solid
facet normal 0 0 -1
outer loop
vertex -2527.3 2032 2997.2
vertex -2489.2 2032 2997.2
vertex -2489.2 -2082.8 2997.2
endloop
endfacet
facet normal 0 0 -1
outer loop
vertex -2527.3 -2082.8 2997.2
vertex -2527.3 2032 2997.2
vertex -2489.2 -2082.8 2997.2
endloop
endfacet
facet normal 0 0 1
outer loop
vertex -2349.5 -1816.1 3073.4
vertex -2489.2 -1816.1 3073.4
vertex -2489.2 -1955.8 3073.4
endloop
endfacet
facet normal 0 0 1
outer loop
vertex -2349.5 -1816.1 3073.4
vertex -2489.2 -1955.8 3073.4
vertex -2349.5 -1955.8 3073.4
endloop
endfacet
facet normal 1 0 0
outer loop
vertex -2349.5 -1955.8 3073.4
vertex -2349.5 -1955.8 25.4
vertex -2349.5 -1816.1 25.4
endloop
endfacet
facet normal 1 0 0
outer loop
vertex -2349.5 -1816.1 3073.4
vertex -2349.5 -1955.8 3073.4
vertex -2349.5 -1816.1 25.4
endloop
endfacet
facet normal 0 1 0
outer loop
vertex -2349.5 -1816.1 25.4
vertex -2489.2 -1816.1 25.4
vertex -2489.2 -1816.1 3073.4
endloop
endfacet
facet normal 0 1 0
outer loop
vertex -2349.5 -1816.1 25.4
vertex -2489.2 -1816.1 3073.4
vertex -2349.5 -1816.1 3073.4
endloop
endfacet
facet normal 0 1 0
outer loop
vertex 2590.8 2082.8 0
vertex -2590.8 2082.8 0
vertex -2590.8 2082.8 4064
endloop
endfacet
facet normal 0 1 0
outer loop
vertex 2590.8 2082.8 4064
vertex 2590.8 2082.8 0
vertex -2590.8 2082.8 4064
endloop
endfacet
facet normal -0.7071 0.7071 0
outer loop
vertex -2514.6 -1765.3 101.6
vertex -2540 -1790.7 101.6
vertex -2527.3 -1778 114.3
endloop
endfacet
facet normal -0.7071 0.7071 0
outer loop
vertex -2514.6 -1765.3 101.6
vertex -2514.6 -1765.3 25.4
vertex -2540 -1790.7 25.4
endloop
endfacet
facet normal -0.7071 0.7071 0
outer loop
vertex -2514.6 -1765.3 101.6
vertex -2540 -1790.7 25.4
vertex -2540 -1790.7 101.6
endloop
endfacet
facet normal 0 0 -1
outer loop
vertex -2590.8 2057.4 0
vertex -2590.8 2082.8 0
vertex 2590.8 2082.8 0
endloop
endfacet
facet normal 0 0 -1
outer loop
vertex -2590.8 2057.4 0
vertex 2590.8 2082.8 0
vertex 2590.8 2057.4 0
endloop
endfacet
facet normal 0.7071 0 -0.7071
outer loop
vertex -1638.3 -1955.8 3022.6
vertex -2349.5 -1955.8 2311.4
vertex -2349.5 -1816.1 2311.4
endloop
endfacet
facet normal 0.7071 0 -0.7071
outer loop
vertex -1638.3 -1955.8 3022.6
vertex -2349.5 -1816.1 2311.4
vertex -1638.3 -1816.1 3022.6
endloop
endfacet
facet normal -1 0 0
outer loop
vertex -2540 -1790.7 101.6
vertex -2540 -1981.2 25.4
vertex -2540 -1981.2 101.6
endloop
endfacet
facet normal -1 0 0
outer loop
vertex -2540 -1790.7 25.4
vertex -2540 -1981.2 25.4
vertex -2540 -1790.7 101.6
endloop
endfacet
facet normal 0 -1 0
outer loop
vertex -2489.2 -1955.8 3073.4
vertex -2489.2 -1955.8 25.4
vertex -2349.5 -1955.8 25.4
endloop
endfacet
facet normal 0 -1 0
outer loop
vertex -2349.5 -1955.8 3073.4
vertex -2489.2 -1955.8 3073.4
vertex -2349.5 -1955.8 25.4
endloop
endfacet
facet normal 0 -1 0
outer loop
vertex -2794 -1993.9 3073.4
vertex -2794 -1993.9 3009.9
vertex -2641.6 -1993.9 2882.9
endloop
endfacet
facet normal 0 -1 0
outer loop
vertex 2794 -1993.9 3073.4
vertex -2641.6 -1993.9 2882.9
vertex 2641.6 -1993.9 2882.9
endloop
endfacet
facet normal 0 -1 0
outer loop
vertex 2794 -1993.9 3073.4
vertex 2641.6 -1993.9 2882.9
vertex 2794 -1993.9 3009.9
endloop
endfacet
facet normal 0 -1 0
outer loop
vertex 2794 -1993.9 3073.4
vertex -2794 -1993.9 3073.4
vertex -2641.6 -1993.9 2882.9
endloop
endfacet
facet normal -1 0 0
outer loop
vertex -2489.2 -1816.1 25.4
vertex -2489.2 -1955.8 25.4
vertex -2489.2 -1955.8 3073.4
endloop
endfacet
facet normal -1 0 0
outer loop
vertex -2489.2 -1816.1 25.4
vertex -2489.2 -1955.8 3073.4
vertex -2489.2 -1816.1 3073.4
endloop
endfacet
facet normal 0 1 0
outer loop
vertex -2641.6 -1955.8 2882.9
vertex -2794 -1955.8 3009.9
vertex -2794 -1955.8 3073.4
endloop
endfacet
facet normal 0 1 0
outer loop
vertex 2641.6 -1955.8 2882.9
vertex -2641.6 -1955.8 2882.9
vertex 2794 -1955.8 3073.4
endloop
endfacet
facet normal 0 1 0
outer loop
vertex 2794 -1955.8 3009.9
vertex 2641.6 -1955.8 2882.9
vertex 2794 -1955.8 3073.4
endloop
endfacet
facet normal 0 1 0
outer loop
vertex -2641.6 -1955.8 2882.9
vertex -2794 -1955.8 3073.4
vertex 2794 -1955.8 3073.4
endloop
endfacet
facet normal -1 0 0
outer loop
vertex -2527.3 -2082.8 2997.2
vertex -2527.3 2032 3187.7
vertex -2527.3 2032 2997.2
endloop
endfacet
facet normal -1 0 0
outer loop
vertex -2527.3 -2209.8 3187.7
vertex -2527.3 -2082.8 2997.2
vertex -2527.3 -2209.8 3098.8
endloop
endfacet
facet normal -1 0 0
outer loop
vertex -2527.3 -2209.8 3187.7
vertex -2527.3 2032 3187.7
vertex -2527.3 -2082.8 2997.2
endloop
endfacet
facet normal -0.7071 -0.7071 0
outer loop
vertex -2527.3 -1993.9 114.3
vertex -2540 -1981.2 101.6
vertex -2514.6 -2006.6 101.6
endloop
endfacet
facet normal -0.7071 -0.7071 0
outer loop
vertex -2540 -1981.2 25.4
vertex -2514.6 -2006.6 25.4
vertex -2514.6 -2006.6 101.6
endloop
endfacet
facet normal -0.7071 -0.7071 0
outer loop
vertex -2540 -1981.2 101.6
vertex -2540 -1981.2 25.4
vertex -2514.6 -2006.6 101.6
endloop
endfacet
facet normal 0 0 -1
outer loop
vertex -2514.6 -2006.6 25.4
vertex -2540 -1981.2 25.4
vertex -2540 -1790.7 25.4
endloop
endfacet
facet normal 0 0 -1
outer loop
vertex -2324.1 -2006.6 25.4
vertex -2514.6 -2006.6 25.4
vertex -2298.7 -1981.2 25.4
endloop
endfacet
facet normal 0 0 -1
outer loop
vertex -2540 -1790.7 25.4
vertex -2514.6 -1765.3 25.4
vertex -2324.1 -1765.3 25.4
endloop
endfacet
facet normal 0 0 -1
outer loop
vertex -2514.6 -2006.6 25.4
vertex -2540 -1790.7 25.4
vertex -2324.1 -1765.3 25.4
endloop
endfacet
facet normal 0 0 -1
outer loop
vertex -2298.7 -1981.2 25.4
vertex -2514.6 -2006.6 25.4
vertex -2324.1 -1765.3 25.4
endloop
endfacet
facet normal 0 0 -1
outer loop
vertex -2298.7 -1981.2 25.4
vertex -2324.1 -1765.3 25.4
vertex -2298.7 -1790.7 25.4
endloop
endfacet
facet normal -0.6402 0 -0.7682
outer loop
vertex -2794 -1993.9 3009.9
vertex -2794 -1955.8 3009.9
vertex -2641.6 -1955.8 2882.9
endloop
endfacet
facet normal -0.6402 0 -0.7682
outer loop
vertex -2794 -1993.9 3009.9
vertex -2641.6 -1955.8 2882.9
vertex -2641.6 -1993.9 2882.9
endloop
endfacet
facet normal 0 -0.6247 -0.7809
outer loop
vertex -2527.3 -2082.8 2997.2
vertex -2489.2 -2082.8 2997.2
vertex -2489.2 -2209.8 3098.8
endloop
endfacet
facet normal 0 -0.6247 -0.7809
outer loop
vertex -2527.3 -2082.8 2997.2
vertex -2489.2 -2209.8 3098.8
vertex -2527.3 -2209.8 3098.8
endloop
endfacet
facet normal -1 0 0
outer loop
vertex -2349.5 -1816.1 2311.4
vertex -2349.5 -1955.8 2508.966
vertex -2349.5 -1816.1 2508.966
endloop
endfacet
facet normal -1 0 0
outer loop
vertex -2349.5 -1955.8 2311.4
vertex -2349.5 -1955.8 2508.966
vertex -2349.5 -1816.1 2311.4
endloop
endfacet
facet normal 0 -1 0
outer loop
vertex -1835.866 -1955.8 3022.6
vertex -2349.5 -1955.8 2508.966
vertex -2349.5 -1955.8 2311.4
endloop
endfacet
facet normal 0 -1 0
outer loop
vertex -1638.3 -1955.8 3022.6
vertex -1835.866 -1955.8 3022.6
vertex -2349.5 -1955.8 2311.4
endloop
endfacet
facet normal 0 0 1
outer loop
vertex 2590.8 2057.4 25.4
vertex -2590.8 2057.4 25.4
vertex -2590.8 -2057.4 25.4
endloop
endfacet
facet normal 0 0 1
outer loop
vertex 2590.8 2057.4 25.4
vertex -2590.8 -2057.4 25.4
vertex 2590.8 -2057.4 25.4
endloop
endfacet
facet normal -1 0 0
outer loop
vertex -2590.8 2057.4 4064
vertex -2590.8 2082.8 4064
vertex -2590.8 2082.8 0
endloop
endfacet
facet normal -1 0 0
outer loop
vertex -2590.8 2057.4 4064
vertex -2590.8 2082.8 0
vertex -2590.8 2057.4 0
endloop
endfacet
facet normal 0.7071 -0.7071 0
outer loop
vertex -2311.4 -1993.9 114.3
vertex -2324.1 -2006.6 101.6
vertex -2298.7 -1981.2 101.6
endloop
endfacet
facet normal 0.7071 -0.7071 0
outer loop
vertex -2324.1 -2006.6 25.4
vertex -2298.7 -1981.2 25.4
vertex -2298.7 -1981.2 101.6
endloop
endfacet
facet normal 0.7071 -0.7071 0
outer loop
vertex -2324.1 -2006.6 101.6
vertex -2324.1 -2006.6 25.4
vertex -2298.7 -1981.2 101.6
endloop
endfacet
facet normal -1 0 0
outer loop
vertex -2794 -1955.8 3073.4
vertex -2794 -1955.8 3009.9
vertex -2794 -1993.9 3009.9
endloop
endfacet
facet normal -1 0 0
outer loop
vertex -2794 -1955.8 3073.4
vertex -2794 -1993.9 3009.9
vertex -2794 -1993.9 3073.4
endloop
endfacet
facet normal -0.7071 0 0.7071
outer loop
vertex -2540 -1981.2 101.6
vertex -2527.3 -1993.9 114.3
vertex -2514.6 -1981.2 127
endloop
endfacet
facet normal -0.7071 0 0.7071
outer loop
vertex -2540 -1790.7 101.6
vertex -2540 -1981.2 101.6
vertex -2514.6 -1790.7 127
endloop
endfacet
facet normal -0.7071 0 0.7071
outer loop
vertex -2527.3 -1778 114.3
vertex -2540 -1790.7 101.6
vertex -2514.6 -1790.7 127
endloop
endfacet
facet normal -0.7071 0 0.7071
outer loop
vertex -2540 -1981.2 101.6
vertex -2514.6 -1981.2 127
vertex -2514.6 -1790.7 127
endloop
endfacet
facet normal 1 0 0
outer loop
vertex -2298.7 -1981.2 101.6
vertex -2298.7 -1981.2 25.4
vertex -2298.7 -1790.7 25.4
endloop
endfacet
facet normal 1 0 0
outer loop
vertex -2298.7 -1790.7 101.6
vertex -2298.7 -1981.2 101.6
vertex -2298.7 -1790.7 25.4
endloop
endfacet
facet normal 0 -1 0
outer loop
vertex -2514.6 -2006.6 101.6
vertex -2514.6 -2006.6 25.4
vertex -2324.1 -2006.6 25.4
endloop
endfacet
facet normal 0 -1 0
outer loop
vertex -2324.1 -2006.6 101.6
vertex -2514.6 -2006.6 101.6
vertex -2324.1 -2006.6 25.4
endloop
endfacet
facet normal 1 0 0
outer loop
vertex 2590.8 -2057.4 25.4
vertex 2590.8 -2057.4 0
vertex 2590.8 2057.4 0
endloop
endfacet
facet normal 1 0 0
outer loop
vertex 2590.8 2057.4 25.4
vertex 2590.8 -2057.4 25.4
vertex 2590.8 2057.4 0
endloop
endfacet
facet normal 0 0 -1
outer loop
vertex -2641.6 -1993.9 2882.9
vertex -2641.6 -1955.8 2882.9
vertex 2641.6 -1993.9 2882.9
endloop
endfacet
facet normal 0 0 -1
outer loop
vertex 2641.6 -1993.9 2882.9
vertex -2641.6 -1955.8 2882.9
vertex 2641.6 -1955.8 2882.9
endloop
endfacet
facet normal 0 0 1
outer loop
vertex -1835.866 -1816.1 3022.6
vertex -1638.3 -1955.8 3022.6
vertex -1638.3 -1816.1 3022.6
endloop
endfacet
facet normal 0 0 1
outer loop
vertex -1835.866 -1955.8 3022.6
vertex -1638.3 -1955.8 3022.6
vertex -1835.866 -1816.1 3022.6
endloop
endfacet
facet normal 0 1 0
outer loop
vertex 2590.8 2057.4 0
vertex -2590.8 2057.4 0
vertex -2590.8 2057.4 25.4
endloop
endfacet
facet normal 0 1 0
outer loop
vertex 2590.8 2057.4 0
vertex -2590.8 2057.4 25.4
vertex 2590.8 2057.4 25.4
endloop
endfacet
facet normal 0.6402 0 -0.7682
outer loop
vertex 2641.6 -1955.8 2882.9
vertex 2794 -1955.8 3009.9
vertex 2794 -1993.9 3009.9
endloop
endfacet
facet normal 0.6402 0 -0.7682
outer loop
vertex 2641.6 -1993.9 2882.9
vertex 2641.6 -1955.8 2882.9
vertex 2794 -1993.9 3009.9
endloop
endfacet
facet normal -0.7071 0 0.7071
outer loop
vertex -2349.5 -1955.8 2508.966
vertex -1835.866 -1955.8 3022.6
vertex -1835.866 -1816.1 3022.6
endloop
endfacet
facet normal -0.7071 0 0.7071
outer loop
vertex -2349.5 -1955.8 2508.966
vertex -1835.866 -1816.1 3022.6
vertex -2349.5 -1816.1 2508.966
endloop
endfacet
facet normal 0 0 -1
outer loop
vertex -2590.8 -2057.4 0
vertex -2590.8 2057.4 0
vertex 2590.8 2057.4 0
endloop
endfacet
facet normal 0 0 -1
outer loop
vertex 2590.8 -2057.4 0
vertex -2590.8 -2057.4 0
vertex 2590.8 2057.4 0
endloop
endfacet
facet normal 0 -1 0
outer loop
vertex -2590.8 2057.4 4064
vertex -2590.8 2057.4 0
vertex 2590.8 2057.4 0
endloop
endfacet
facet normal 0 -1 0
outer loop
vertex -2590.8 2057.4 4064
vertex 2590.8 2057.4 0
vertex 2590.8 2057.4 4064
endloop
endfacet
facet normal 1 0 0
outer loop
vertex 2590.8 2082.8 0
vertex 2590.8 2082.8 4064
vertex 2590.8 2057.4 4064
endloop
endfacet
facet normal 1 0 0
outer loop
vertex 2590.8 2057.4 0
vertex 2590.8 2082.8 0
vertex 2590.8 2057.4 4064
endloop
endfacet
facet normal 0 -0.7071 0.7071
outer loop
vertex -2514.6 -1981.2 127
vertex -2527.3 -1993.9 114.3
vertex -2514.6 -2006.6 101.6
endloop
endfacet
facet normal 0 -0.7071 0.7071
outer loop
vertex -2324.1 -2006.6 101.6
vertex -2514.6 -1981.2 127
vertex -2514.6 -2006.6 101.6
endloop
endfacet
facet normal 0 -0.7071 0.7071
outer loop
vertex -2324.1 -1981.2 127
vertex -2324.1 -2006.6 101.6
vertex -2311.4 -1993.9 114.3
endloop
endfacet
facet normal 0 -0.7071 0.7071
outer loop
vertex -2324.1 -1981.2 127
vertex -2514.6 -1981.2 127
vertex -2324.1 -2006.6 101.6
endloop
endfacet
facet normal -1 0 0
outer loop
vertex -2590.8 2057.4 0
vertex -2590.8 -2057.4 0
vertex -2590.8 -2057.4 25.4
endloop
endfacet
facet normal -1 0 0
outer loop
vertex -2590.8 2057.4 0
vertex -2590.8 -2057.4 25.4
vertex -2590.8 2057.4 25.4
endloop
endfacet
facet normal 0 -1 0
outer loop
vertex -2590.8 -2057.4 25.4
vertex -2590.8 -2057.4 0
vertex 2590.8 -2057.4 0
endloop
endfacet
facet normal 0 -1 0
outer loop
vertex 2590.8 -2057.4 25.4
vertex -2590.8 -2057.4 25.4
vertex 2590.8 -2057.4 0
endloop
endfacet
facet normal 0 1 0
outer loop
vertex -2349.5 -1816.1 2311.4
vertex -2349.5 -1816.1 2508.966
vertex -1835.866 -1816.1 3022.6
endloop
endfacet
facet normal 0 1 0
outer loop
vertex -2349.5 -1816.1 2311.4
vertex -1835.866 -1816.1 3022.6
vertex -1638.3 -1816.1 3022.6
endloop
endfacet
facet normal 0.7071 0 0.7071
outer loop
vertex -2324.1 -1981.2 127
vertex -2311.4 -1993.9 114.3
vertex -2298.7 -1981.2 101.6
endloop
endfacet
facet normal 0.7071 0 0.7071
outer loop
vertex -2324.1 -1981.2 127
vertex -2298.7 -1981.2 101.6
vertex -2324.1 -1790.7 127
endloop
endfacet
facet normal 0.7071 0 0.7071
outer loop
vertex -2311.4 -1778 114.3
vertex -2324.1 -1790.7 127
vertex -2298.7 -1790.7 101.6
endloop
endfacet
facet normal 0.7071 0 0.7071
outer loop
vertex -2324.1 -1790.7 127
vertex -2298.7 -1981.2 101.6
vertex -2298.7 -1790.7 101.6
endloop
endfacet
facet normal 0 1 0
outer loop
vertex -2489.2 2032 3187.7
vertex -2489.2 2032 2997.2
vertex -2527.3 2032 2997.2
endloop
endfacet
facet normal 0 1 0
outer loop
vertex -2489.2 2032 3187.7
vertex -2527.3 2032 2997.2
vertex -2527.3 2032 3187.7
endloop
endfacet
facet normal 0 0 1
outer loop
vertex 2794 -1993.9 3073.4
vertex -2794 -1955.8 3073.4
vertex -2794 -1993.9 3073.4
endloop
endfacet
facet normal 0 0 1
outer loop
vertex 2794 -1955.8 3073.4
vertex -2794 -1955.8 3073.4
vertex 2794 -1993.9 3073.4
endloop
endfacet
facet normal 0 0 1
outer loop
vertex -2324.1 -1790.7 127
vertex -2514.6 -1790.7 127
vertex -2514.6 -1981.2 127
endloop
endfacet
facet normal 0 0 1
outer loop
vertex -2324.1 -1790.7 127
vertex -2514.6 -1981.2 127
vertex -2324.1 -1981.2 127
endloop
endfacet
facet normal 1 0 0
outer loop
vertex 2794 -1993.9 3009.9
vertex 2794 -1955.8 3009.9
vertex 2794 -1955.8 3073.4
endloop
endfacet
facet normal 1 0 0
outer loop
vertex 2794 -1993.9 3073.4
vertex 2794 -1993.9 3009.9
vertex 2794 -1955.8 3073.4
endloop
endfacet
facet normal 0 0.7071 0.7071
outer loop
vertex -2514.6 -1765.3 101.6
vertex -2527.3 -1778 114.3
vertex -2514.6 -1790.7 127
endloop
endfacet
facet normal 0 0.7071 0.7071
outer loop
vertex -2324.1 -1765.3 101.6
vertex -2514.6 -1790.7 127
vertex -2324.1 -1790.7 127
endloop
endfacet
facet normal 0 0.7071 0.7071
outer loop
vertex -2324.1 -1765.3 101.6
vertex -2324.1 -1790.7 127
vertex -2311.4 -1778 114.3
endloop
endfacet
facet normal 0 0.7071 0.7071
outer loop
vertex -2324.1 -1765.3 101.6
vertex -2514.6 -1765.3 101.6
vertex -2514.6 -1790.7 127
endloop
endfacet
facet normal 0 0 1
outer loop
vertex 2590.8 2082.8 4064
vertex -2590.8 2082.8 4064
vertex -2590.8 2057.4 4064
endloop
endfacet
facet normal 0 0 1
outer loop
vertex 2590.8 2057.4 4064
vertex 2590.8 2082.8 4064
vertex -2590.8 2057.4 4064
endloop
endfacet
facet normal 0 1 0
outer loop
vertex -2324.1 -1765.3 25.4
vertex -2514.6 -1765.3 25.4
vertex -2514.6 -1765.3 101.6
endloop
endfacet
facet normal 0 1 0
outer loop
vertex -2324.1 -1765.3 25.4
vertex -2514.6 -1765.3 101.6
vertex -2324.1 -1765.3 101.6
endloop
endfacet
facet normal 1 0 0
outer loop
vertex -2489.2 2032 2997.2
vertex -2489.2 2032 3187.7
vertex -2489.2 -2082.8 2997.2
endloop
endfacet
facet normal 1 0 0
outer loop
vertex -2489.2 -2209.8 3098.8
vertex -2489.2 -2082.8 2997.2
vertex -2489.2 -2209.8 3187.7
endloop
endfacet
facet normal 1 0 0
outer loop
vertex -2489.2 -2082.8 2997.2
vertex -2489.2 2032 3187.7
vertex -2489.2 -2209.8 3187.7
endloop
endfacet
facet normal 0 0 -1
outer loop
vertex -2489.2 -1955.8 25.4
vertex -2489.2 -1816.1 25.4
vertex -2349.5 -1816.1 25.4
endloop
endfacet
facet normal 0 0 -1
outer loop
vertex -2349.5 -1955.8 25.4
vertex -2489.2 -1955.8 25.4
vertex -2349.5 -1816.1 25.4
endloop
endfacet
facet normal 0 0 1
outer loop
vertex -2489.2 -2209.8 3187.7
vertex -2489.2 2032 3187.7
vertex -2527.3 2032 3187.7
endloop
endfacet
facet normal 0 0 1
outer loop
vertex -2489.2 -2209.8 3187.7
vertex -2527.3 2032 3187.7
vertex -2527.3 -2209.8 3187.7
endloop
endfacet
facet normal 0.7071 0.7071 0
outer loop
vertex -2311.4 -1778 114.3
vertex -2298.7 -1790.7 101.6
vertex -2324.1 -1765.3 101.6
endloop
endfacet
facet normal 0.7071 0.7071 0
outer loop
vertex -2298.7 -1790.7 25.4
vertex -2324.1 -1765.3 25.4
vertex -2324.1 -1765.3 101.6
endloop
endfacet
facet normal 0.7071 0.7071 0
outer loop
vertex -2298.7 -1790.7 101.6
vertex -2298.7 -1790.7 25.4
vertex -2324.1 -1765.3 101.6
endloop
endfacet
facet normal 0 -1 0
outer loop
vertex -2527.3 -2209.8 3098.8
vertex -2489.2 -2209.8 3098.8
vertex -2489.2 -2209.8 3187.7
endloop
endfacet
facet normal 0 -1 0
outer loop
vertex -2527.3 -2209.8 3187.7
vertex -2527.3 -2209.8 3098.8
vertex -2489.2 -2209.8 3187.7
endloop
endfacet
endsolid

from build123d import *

# Parameters (mm, degrees)
F0_W      = 5181.6
F0_H      = 4114.8
F1_DEPTH  = 25.4
F2_W      = 25.4
F2_H      = 4064
F3_DEPTH  = 5181.6
F4_W      = 139.7
F4_H      = 139.7
F5_DEPTH  = 3048
F6_W      = 5588
F6_H      = 190.5
F7_DEPTH  = 38.1
F8_SIZE2  = 127
F8_SIZE   = 152.4
F9_W      = 4241.8
F9_H      = 190.5
F10_DEPTH = 38.1
F11_SIZE2 = 127
F11_SIZE  = 101.6
F13_DEPTH = 139.7
F14_W     = 241.3
F14_H     = 241.3
F15_DEPTH = 101.6
F16_SIZE  = 25.4
F17_SIZE  = 25.4


with BuildPart() as f1:
    # F0 (on Top) → F1 (new body)
    with BuildSketch(Plane.XY):
        Rectangle(F0_W, F0_H)
    extrude(amount=F1_DEPTH)


with BuildPart() as f3:
    # F2 (on face) → F3 (new body, through all)
    with BuildSketch(Plane(origin=(-2590.8, 0, 0), x_dir=(0, -1, 0), z_dir=(-1, 0, 0))):
        with Locations((-2070.1, 2032)):
            Rectangle(F2_W, F2_H)
    extrude(amount=-F3_DEPTH)


with BuildPart() as f5:
    # F4 (on face) → F5 (new body)
    with BuildSketch(Plane.XY.offset(25.4)):
        with Locations((-2419.35, -1885.95)):
            Rectangle(F4_W, F4_H)
    extrude(amount=F5_DEPTH)


with BuildPart() as f7:
    # F6 (on face) → F7 (new body)
    with BuildSketch(Plane.XZ.offset(1955.8)):
        with Locations((0, 2978.15)):
            Rectangle(F6_W, F6_H)
    extrude(amount=F7_DEPTH)

    # F8
    f8_edges = [f7.edges().sort_by_distance(p)[0] for p in [
        (-2794, -1974.85, 2882.9),
        (2794, -1974.85, 2882.9),
    ]]
    f8_side = f7.faces().sort_by_distance((0, -1974.85, 2882.9))[0]
    chamfer(f8_edges, length=F8_SIZE, length2=F8_SIZE2, reference=f8_side)


with BuildPart() as f10:
    # F9 (on face) → F10 (new body)
    with BuildSketch(Plane(origin=(-2489.2, 0, 0), x_dir=(0, -1, 0), z_dir=(-1, 0, 0))):
        with Locations((88.9, 3092.45)):
            Rectangle(F9_W, F9_H)
    extrude(amount=F10_DEPTH)

    # F11
    f11_edges = [f10.edges().sort_by_distance(p)[0] for p in [
        (-2508.25, -2209.8, 2997.2),
    ]]
    f11_side = f10.faces().sort_by_distance((-2508.25, -2209.8, 3092.45))[0]
    chamfer(f11_edges, length=F11_SIZE, length2=F11_SIZE2, reference=f11_side)


with BuildPart() as f13:
    # F12 (on face) → F13 (new body)
    with BuildSketch(Plane.XZ.offset(1955.8)):
        Polygon((-1835.8656346635, 3022.6), (-2349.5, 2508.9656346635), (-2349.5, 2311.4), (-1638.3, 3022.6), align=None)
    extrude(amount=-F13_DEPTH)


with BuildPart() as f15:
    # F14 (on face) → F15 (new body)
    with BuildSketch(Plane.XY.offset(25.4)):
        with Locations((-2419.35, -1885.95)):
            Rectangle(F14_W, F14_H)
    extrude(amount=F15_DEPTH)

    # F16
    f16_edges = [f15.edges().sort_by_distance(p)[0] for p in [
        (-2540, -2006.6, 76.2),
        (-2540, -1765.3, 76.2),
        (-2298.7, -2006.6, 76.2),
        (-2298.7, -1765.3, 76.2),
    ]]
    chamfer(f16_edges, length=F16_SIZE)

    # F17 (call 1 of 4: OpenCascade refuses the feature's edges together)
    f17_edges = [f15.edges().sort_by_distance(p)[0] for p in [
        (-2540, -1885.95, 127),
    ]]
    chamfer(f17_edges, length=F17_SIZE)

    # F17#2 (call 2 of 4)
    f17_2_edges = [f15.edges().sort_by_distance(p)[0] for p in [
        (-2419.35, -2006.6, 127),
    ]]
    chamfer(f17_2_edges, length=F17_SIZE)

    # F17#3 (call 3 of 4)
    f17_3_edges = [f15.edges().sort_by_distance(p)[0] for p in [
        (-2298.7, -1885.95, 127),
    ]]
    chamfer(f17_3_edges, length=F17_SIZE)

    # F17#4 (call 4 of 4)
    f17_4_edges = [f15.edges().sort_by_distance(p)[0] for p in [
        (-2419.35, -1765.3, 127),
    ]]
    chamfer(f17_4_edges, length=F17_SIZE)


solid = Compound([f1.part, f3.part, f5.part, f7.part, f10.part, f13.part, f15.part])
